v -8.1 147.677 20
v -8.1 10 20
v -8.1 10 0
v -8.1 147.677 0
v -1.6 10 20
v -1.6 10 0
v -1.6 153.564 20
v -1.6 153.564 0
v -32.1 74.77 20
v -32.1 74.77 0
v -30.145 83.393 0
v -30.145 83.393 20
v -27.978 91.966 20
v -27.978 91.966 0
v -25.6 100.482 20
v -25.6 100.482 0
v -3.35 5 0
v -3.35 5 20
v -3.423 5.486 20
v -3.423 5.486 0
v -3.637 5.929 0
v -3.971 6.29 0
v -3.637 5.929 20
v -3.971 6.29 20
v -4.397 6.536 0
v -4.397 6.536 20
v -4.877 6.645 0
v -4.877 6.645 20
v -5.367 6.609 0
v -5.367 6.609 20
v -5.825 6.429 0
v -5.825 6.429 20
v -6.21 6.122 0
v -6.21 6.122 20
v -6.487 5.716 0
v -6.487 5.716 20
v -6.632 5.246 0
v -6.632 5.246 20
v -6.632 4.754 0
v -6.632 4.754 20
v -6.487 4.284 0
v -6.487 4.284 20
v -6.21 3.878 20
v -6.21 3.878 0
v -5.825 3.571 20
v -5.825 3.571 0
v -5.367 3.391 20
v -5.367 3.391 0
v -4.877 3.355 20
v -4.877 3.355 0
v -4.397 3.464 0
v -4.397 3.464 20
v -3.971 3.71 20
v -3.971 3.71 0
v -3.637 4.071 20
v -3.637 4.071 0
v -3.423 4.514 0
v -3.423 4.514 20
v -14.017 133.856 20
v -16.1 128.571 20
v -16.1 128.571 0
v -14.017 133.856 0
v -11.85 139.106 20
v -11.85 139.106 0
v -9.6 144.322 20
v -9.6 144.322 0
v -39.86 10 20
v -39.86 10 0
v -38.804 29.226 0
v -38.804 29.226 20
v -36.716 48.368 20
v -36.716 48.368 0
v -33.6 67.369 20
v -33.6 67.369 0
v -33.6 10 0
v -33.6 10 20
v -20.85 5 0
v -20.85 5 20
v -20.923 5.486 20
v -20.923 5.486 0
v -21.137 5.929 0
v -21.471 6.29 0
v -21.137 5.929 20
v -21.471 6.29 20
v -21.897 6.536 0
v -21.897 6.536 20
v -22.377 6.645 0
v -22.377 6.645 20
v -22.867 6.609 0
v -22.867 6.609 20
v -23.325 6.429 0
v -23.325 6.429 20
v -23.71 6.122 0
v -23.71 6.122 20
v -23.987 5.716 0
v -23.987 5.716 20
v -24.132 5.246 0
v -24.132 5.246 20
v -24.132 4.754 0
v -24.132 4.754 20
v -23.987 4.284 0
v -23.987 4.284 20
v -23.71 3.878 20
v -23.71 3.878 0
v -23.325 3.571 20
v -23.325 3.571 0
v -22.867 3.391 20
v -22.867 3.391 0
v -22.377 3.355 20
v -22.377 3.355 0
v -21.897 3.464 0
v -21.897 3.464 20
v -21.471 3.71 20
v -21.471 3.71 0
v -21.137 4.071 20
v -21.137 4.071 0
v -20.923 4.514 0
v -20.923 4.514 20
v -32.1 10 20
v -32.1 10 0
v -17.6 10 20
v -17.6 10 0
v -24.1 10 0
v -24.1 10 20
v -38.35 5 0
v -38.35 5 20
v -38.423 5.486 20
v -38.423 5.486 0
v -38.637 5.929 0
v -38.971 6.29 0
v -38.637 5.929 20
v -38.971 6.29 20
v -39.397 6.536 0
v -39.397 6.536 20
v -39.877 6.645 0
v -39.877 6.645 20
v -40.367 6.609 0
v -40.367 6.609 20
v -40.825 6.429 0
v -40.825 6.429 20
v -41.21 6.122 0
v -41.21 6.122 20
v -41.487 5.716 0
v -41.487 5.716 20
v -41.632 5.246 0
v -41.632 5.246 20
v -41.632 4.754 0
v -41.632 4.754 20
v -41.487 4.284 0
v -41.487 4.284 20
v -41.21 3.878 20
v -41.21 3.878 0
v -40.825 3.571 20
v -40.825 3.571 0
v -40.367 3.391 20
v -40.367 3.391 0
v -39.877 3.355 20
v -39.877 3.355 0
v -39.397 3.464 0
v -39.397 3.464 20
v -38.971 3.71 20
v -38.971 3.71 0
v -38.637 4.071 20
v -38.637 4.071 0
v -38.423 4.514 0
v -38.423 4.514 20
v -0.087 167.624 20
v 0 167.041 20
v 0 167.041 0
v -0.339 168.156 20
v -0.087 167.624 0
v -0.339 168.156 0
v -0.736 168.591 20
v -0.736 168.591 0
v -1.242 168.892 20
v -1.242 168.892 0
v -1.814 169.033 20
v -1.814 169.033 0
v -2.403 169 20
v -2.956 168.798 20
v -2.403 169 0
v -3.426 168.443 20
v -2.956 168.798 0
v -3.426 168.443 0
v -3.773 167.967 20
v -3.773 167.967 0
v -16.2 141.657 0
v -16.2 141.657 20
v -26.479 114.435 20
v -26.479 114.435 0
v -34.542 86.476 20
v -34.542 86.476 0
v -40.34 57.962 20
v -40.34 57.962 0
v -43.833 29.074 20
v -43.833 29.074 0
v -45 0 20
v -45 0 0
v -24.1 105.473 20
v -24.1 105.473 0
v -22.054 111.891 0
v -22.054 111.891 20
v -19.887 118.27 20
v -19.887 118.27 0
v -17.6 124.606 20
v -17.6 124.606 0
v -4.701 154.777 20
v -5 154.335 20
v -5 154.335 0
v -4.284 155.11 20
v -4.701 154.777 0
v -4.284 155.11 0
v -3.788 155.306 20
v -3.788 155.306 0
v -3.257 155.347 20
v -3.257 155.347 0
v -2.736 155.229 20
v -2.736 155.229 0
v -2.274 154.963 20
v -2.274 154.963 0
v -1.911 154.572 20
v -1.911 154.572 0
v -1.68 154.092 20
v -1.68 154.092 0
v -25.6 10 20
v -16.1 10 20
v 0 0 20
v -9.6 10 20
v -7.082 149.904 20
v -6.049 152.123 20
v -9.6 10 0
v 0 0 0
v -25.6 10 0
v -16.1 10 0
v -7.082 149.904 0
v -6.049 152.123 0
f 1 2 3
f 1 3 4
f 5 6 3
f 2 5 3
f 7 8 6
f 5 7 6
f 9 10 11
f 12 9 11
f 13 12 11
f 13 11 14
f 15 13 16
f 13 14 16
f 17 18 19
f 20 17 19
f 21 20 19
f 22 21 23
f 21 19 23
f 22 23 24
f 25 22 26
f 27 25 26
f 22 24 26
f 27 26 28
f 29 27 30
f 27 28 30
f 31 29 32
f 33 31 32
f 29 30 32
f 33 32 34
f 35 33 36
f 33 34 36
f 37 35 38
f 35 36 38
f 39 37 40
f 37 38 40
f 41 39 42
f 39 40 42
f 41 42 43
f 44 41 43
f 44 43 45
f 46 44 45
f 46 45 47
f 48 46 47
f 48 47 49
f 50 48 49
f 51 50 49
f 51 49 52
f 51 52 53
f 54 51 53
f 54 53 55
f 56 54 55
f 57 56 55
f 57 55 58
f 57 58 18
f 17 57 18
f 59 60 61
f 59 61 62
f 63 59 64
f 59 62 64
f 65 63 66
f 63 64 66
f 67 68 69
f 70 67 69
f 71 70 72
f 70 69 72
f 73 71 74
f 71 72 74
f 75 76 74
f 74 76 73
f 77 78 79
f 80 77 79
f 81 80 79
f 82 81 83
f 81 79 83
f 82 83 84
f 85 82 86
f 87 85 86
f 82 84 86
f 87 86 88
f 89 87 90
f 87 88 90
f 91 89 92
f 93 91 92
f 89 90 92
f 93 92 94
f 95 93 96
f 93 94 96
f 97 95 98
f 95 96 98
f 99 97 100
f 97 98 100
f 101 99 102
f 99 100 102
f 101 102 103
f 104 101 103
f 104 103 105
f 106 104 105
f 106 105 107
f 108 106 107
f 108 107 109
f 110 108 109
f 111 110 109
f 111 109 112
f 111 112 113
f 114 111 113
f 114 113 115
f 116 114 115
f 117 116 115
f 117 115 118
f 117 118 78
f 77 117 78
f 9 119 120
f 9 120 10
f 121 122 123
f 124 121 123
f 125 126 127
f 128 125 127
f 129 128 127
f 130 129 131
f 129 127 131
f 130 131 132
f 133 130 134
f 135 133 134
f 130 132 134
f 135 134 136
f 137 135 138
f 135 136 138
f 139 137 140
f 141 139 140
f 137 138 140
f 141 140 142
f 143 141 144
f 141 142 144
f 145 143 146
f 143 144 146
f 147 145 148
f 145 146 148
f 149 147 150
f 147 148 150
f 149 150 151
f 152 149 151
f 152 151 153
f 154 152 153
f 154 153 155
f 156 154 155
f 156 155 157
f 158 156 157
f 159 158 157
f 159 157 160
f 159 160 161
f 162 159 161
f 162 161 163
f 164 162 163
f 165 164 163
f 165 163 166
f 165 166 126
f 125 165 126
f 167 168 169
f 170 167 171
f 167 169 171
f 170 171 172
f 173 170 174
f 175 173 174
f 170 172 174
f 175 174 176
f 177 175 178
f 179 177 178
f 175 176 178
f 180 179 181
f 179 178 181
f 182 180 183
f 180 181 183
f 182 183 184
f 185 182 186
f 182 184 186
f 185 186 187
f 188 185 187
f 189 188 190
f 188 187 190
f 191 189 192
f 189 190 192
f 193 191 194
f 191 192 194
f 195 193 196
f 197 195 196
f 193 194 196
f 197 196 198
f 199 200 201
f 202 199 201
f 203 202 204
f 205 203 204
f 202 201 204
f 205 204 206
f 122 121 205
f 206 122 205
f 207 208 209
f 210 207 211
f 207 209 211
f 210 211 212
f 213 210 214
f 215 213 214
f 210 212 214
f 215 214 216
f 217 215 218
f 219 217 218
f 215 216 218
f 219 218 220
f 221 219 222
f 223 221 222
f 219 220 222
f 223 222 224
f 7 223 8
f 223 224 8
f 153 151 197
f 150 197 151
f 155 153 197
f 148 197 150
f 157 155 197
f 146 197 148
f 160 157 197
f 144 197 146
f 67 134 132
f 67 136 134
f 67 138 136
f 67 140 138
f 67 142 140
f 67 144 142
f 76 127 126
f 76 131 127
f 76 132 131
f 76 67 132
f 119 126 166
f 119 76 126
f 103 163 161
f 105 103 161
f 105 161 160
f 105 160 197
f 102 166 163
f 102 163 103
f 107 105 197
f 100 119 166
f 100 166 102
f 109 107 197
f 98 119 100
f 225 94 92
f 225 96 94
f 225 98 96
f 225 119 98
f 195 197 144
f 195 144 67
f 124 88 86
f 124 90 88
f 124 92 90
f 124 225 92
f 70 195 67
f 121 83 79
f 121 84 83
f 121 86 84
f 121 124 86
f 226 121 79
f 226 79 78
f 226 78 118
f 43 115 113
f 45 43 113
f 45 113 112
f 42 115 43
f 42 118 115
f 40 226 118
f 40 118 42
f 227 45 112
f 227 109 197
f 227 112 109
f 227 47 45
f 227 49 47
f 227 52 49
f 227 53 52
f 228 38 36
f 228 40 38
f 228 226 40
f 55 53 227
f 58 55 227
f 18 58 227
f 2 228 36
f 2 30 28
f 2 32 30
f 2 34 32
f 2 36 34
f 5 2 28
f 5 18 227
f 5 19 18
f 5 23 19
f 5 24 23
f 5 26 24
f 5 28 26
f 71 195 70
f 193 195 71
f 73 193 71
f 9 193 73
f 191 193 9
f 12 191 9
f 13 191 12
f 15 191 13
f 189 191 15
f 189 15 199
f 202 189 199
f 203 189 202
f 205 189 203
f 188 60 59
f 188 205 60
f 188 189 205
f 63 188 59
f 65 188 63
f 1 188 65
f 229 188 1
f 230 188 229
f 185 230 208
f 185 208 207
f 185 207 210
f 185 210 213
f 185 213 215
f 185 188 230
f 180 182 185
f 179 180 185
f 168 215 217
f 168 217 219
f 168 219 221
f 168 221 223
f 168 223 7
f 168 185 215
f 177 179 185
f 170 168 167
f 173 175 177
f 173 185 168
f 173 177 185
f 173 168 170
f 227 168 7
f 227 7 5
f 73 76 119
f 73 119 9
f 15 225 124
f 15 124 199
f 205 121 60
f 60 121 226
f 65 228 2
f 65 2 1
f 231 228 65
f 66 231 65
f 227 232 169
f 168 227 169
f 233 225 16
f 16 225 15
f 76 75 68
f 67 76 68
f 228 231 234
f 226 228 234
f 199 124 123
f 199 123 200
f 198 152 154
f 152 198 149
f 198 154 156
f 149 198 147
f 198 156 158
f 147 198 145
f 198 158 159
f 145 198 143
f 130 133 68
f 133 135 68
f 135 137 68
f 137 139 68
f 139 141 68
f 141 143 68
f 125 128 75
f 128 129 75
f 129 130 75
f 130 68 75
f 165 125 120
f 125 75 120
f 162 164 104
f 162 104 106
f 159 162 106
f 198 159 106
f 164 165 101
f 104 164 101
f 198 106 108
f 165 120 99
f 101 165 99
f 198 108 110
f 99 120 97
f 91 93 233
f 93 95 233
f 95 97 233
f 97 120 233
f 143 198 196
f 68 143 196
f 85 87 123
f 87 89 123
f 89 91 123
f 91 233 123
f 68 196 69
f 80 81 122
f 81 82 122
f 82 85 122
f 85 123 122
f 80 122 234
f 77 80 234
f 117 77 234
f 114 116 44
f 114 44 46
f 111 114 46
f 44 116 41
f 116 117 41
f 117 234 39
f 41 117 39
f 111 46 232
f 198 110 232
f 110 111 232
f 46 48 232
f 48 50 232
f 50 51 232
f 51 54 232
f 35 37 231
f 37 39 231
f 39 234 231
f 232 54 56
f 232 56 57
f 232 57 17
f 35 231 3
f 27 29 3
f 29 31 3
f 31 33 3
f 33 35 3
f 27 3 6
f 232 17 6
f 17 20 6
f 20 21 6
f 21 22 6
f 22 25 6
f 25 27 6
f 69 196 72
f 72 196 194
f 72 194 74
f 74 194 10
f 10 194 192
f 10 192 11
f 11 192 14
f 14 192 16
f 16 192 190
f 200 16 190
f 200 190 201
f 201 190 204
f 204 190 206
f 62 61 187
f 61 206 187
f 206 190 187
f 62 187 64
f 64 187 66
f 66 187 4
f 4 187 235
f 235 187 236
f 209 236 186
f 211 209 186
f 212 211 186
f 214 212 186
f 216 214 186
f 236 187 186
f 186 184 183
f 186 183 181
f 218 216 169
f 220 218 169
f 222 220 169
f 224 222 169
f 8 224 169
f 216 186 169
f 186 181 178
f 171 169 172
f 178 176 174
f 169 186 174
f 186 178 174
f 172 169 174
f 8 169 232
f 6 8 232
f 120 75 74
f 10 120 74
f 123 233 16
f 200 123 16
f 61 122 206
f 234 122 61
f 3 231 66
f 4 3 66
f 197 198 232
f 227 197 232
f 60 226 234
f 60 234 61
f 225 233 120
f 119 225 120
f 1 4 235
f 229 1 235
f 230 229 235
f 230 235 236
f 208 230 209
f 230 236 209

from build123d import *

# Parameters (mm, degrees)
BOSS_EXTRUDE4_DEPTH  = 20
SKETCH12_R           = 1.65
CUT_EXTRUDE1_DEPTH   = 177.068006068
SKETCH14_W           = 1.5
SKETCH14_H           = 148.56444562
BOSS_EXTRUDE5_DEPTH  = 20
CUT_EXTRUDE2_START   = -20
CUT_EXTRUDE2_DEPTH   = 20
CUT_EXTRUDE3_START   = -30
CUT_EXTRUDE3_DEPTH   = 30
LPATTERN2_COUNT      = 5
LPATTERN2_PITCH      = 8
LPATTERN2_COUNT_DIR2 = 5
LPATTERN2_PITCH_DIR2 = 8
CUT_EXTRUDE4_START   = -30
CUT_EXTRUDE4_DEPTH   = 30


with BuildPart() as part:
    # Sketch5 → Boss-Extrude4 (new body)
    with BuildSketch(Plane.XY):
        with BuildLine():
            Line((0, 0), (0, 167.041245738))
            ThreePointArc((0, 167.041245738), (-1.523254023, 168.9835931), (-3.772713274, 167.967252028))
            ThreePointArc((-3.772713274, 167.967252028), (-34.542452011, 86.476422979), (-45, 0))
            Line((-45, 0), (0, 0))
        make_face()
        with BuildLine():
            Line((-1.6, 10), (-39.860221142, 10))
            ThreePointArc((-39.860221142, 10), (-30.000299364, 83.996114978), (-5, 154.335493145))
            ThreePointArc((-5, 154.335493145), (-2.992115624, 155.307611869), (-1.6, 153.56444562))
            Line((-1.6, 153.56444562), (-1.6, 10))
        make_face(mode=Mode.SUBTRACT)
    extrude(amount=BOSS_EXTRUDE4_DEPTH)

    # Sketch12 → Cut-Extrude1 (cut, through all)
    with BuildSketch(Plane.XY.offset(20)):
        with Locations((-40, 5)):
            Circle(SKETCH12_R)
        with Locations((-22.5, 5)):
            Circle(SKETCH12_R)
        with Locations((-5, 5)):
            Circle(SKETCH12_R)
    extrude(amount=-CUT_EXTRUDE1_DEPTH, mode=Mode.SUBTRACT)

    # Sketch14 → Boss-Extrude5 (add)
    with BuildSketch(Plane.XY.offset(20)):
        with Locations((-0.85, 84.28222281)):
            Rectangle(SKETCH14_W, SKETCH14_H)
    boss_extrude5 = extrude(amount=-BOSS_EXTRUDE5_DEPTH)

    # Sketch17 → Cut-Extrude2 (cut)
    with BuildSketch(Plane.XY.offset(20).offset(CUT_EXTRUDE2_START)):
        Polygon((-120.638203698, 868.825955305), (-109.129206393, -31.174044695), (790.870793607, -19.66504739), (784.13367644, 507.175413991), align=None)
        with BuildLine():
            Line((-45, 0), (0, 0))
            Line((0, 0), (0, 167.041245738))
            ThreePointArc((0, 167.041245738), (-1.523254023, 168.9835931), (-3.772713274, 167.967252028))
            ThreePointArc((-3.772713274, 167.967252028), (-34.542452011, 86.476422979), (-45, 0))
        make_face(mode=Mode.SUBTRACT)
    extrude(amount=CUT_EXTRUDE2_DEPTH, mode=Mode.SUBTRACT)

    # Sketch18 → Cut-Extrude3 (cut)
    with BuildSketch(Plane.XY.offset(20).offset(CUT_EXTRUDE3_START)):
        Polygon((10.567687301, -7.152622061), (26.572035637, 318.782087337), (-234.729728554, 306.471050155), (-205.798791176, -46.855716973), align=None)
        with BuildLine():
            Line((-45, 0), (0, 0))
            Line((0, 0), (0, 167.041245738))
            ThreePointArc((0, 167.041245738), (-1.523254023, 168.9835931), (-3.772713274, 167.967252028))
            ThreePointArc((-3.772713274, 167.967252028), (-34.542452011, 86.476422979), (-45, 0))
        make_face(mode=Mode.SUBTRACT)
    extrude(amount=CUT_EXTRUDE3_DEPTH, mode=Mode.SUBTRACT)

    # LPattern2: Boss-Extrude5 5 × 5, 10 skipped
    with Locations(*[Vector(-1, 0, 0) * (i * LPATTERN2_PITCH) + Vector(-1, 0, 0) * (j * LPATTERN2_PITCH_DIR2) for i in range(LPATTERN2_COUNT) for j in range(LPATTERN2_COUNT_DIR2) if (i, j) not in ((0, 0), (1, 4), (2, 3), (2, 4), (3, 2), (3, 3), (3, 4), (4, 1), (4, 2), (4, 3), (4, 4))]):
        add(boss_extrude5)

    # Sketch19 → Cut-Extrude4 (cut)
    with BuildSketch(Plane.XY.offset(20).offset(CUT_EXTRUDE4_START)):
        Polygon((-113.909990018, -19.131609845), (183.246695872, -29.17634289), (134.697152825, 220.267861041), (-171.248674479, 235.334960607), align=None)
        with BuildLine():
            Line((-45, 0), (0, 0))
            Line((0, 0), (0, 167.041245738))
            ThreePointArc((0, 167.041245738), (-1.523254023, 168.9835931), (-3.772713274, 167.967252028))
            ThreePointArc((-3.772713274, 167.967252028), (-34.542452011, 86.476422979), (-45, 0))
        make_face(mode=Mode.SUBTRACT)
    extrude(amount=CUT_EXTRUDE4_DEPTH, mode=Mode.SUBTRACT)


solid = part.part
